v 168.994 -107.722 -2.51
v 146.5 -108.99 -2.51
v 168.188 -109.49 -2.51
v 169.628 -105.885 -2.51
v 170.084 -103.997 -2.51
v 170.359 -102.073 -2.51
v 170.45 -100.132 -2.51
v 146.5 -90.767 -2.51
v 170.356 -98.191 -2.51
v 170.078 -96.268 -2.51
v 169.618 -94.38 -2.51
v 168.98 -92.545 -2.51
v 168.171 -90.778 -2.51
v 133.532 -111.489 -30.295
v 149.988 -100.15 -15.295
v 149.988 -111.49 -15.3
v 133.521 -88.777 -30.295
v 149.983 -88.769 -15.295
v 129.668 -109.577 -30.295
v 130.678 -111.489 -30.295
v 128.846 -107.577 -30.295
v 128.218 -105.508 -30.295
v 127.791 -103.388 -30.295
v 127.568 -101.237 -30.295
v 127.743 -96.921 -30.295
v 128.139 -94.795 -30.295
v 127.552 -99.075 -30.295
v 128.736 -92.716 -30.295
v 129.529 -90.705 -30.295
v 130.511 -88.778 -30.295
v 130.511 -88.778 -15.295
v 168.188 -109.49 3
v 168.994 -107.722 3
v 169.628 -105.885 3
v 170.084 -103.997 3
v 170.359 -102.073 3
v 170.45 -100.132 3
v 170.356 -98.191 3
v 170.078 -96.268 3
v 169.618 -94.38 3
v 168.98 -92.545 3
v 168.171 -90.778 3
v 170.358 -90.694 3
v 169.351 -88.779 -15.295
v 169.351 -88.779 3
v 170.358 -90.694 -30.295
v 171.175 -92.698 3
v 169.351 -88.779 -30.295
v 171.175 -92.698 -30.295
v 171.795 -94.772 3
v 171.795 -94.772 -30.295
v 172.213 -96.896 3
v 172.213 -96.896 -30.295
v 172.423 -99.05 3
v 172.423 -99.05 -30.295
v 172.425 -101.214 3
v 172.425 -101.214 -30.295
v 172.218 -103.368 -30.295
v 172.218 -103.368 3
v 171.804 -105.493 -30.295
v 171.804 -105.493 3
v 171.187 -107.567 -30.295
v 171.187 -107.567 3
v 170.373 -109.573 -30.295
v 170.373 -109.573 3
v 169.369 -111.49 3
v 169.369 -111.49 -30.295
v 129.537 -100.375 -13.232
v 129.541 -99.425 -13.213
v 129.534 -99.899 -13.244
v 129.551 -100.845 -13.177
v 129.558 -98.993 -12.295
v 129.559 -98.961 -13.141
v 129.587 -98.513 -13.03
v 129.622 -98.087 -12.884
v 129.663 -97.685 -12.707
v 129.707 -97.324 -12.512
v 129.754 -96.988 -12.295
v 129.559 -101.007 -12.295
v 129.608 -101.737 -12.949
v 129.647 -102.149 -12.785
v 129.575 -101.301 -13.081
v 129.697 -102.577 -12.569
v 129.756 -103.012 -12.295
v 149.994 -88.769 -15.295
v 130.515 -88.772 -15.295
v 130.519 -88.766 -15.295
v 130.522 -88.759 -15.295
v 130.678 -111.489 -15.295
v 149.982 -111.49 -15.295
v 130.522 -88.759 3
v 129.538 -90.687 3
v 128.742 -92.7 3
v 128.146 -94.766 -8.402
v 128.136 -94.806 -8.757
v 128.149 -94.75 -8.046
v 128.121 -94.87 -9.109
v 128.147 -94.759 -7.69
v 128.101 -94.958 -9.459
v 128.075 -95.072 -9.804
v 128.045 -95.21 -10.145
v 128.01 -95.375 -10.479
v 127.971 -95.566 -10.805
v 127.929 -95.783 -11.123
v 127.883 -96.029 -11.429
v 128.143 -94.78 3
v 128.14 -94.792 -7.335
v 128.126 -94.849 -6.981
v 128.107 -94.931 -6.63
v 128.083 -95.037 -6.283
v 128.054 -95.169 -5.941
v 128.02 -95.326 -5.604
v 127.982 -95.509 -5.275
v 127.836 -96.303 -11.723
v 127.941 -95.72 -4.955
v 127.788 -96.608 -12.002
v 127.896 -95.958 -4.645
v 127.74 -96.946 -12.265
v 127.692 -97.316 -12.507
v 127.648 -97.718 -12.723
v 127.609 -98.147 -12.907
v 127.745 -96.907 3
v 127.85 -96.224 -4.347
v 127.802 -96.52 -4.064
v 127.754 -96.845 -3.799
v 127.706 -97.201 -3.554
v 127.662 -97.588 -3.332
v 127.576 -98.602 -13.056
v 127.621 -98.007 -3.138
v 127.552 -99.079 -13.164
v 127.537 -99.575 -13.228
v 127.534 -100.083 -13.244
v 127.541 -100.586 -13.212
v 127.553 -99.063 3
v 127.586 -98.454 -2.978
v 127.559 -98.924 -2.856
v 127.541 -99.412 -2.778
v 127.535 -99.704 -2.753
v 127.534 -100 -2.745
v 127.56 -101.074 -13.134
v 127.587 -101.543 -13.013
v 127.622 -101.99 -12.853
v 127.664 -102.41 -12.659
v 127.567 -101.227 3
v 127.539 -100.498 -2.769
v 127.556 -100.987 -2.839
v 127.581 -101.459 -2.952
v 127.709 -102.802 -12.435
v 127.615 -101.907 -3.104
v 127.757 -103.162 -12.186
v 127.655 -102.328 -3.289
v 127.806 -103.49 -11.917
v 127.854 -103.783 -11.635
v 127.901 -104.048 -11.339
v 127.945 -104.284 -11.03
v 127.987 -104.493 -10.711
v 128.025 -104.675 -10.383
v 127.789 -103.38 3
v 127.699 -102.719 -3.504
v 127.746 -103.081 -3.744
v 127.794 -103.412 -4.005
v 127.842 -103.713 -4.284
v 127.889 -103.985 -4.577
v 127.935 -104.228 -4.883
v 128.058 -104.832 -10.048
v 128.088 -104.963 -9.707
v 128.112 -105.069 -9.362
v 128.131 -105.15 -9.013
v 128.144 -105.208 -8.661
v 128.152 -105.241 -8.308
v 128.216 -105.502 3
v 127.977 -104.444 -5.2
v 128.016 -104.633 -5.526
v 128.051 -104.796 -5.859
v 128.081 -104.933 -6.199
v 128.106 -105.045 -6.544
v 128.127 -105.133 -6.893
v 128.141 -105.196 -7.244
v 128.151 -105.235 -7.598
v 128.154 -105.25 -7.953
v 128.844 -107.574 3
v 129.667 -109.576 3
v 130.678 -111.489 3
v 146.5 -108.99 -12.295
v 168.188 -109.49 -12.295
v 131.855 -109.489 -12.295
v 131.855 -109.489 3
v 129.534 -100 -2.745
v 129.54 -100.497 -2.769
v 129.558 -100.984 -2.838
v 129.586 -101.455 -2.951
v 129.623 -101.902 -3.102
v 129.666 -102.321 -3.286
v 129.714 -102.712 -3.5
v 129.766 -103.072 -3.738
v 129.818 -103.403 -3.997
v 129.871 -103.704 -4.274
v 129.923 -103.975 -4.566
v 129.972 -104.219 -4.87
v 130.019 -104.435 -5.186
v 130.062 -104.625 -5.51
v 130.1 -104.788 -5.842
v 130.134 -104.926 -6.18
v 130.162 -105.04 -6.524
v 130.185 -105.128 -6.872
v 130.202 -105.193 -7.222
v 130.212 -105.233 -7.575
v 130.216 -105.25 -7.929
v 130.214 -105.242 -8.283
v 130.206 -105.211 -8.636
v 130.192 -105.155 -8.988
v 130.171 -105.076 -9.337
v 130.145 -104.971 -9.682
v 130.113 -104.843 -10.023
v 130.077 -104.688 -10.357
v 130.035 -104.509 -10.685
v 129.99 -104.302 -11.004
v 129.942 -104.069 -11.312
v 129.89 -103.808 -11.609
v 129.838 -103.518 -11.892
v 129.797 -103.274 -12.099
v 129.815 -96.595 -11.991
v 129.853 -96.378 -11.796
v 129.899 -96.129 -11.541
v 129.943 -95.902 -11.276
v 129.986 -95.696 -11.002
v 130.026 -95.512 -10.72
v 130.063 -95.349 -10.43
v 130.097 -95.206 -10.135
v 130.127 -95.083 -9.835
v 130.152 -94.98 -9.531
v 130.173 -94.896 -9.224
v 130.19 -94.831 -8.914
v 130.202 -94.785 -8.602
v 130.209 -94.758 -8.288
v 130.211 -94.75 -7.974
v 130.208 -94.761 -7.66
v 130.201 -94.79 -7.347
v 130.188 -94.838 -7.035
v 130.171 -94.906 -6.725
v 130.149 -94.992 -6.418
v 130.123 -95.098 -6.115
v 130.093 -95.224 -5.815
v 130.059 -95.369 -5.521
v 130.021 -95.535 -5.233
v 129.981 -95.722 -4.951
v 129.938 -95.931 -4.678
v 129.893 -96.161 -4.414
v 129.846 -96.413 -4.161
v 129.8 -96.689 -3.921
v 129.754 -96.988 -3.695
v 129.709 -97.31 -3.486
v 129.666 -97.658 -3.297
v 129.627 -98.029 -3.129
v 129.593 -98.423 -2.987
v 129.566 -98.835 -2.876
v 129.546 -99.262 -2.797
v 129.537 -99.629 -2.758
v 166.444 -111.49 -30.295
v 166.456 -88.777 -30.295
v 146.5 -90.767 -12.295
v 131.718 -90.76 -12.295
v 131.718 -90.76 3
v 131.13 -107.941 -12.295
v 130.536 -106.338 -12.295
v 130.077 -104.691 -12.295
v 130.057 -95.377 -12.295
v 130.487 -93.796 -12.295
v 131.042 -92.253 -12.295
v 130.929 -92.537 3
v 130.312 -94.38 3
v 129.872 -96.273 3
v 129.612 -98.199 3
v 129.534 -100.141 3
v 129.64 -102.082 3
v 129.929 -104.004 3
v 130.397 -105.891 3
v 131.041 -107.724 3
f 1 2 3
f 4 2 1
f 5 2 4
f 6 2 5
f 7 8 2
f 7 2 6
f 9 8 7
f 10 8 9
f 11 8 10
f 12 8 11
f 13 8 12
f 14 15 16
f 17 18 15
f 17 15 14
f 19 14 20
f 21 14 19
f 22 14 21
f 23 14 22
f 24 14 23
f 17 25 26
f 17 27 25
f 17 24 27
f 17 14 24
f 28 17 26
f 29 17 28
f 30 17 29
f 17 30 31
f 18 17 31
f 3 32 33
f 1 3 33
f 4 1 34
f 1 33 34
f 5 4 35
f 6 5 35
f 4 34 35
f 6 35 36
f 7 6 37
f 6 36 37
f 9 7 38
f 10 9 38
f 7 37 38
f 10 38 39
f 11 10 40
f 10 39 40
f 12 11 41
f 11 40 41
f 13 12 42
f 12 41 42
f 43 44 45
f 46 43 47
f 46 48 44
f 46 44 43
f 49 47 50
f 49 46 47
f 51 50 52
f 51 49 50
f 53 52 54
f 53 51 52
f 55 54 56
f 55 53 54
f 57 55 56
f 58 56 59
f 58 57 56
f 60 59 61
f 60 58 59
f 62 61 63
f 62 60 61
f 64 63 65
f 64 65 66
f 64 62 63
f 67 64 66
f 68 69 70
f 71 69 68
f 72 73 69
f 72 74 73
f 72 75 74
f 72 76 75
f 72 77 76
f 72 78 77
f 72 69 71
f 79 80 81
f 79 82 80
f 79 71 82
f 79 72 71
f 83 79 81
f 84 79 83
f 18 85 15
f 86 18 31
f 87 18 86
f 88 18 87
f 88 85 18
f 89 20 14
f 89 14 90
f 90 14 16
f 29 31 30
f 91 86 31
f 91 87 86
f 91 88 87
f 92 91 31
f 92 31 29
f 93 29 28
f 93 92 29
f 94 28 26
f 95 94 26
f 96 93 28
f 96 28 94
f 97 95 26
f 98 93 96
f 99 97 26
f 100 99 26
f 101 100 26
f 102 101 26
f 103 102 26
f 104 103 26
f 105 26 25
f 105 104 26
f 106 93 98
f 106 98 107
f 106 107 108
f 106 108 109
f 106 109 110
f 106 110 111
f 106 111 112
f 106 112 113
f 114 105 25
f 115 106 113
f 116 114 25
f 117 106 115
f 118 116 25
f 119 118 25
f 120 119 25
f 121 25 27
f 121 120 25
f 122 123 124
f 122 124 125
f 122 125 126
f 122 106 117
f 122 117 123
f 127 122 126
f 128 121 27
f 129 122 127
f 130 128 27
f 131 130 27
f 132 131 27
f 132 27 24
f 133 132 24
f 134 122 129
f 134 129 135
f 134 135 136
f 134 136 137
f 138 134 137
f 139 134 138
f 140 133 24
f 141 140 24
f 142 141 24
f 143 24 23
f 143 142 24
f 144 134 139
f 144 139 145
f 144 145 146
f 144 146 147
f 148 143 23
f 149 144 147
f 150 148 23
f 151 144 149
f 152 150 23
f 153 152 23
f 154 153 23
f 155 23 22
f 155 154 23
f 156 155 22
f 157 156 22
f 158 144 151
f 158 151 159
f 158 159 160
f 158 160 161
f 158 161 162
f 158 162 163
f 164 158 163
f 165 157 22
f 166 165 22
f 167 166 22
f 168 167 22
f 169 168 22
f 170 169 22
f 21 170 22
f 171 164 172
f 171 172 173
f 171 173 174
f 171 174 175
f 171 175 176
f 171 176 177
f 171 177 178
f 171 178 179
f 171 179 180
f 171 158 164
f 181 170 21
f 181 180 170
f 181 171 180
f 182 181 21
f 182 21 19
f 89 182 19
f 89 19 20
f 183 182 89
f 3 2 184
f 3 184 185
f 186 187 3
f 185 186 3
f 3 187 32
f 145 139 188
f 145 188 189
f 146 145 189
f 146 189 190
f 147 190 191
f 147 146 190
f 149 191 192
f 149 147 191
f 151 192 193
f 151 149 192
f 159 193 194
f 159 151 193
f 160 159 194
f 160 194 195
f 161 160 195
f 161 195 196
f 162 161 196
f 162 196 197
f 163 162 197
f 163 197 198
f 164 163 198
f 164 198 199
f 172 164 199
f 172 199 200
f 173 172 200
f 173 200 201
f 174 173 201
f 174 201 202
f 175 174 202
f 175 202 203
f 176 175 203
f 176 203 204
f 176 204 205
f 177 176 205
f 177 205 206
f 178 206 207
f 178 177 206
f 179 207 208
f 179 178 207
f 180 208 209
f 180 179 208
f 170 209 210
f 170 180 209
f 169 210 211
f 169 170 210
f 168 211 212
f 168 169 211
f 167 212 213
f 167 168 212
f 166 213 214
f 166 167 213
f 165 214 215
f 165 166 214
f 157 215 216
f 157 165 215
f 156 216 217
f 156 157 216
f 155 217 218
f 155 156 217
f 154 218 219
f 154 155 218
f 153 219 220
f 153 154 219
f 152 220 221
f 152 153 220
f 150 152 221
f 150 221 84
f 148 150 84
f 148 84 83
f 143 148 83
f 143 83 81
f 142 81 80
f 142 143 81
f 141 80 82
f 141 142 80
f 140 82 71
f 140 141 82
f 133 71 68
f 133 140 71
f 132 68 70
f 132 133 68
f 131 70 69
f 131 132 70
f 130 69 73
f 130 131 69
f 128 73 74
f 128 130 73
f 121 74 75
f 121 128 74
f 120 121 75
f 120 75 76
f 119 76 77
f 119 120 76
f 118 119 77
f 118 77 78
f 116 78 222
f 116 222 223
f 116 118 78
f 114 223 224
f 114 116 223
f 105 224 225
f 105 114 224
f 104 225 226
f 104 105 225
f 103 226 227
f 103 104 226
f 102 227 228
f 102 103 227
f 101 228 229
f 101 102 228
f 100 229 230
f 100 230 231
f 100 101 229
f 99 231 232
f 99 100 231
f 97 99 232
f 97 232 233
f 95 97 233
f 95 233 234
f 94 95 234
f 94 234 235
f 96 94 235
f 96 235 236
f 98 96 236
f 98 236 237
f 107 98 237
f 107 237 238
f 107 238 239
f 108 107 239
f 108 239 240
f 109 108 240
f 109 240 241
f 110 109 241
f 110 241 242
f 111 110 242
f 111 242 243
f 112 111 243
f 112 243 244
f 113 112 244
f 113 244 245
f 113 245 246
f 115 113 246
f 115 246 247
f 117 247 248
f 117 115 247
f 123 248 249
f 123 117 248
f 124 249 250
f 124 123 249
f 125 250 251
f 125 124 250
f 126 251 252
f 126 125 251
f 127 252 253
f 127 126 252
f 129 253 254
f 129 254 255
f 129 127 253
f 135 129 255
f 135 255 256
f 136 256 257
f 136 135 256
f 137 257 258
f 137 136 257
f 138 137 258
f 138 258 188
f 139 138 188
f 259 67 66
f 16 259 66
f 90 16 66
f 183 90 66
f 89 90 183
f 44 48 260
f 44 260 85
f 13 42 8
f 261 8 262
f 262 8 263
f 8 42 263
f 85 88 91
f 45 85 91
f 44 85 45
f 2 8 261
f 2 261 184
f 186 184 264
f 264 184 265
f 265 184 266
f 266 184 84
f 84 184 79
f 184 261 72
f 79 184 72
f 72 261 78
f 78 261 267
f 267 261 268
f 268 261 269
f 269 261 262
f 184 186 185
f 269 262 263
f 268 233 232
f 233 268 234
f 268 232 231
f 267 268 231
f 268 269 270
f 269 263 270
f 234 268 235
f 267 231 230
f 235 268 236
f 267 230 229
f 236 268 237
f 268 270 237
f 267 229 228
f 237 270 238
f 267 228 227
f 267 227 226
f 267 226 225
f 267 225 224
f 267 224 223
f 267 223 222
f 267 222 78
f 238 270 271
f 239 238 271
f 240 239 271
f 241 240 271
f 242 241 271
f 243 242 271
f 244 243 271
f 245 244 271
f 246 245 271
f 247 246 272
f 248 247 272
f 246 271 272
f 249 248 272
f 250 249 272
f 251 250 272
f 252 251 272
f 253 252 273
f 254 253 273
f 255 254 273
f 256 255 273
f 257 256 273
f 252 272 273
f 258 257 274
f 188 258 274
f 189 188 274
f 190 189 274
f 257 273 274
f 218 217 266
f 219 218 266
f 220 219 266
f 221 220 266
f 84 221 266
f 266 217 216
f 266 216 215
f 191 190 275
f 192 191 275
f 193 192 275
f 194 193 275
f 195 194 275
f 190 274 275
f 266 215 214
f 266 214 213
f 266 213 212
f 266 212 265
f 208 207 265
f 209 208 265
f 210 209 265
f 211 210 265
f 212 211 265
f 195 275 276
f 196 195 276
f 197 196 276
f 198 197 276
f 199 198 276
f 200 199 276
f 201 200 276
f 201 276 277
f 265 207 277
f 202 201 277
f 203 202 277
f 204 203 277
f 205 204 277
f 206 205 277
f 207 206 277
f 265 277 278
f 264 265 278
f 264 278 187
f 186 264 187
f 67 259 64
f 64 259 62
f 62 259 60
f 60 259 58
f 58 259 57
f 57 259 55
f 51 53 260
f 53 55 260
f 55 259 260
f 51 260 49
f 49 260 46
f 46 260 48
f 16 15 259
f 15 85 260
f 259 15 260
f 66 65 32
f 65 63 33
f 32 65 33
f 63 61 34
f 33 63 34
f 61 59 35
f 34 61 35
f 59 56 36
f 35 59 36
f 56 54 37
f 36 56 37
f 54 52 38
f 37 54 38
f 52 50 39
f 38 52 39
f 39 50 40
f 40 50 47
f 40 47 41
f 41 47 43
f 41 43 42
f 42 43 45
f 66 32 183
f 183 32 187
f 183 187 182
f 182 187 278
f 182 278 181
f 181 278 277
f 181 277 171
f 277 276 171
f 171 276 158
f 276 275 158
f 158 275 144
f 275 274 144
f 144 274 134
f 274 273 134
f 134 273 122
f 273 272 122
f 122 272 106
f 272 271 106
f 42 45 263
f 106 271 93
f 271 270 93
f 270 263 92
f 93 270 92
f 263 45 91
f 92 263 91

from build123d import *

# Parameters (mm, degrees)
BOSS_EXTRUDE1_DEPTH     = 15.295
CUT_EXTRUDE1_DEPTH      = 206.919868261
FLOOR_START             = 3
FLOOR_2_DEPTH           = 3
BOSS_EXTRUDE4_START     = 9.785
BOSS_EXTRUDE4_DEPTH     = 9.785
CUT_EXTRUDE3_REACH      = 207.92
CUT_EXTRUDE3_END_RADIUS = 20.596434206
SKETCH7_R               = 5.25
BOSS_EXTRUDE5_REACH     = 176.665
SKETCH14_OUTSIDE_W      = 59.009
SKETCH14_OUTSIDE_H      = 36.805
CUT_EXTRUDE4_DEPTH      = 33.295


with BuildPart() as part:
    # Sketch1 → Boss-Extrude1 (new body)
    with BuildSketch(Plane(origin=(0, 0, -12.295), x_dir=(-1, 0, 0), z_dir=(0, 0, -1))):
        with BuildLine():
            Line((-169.369133898, -111.490025098), (-130.678433581, -111.48937301))
            ThreePointArc((-130.678433581, -111.48937301), (-127.534095849, -100.145401406), (-130.522109497, -88.759255177))
            Line((-130.522109497, -88.759255177), (-169.350721063, -88.778648203))
            ThreePointArc((-169.350721063, -88.778648203), (-172.450070697, -100.131831373), (-169.369133898, -111.490025098))
        make_face()
    extrude(amount=-BOSS_EXTRUDE1_DEPTH)

    # Sketch2 → Cut-Extrude1 (cut, through all)
    with BuildSketch(Plane.XY.offset(3)):
        with BuildLine():
            Line((168.171133654, -90.778059306), (131.717568579, -90.759852501))
            ThreePointArc((131.717568579, -90.759852501), (129.534116109, -100.141151153), (131.855022492, -109.48939284))
            Line((131.855022492, -109.48939284), (168.187605365, -109.490005184))
            ThreePointArc((168.187605365, -109.490005184), (170.450070154, -100.132033398), (168.171133654, -90.778059306))
        make_face()
    extrude(amount=-CUT_EXTRUDE1_DEPTH, mode=Mode.SUBTRACT)

    # Sketch4 → floor 2 (add)
    with BuildSketch(Plane(origin=(0, 0, -12.295), x_dir=(-1, 0, 0), z_dir=(0, 0, -1)).offset(FLOOR_START)):
        with BuildLine():
            Line((-169.369133898, -111.490025098), (-130.678433581, -111.48937301))
            ThreePointArc((-130.678433581, -111.48937301), (-127.534095849, -100.145401406), (-130.522109497, -88.759255177))
            Line((-130.522109497, -88.759255177), (-169.350721063, -88.778648203))
            ThreePointArc((-169.350721063, -88.778648203), (-172.450070697, -100.131831373), (-169.369133898, -111.490025098))
        make_face()
    extrude(amount=-FLOOR_2_DEPTH)

    # Sketch6 → Boss-Extrude4 (add)
    with BuildSketch(Plane.XY.offset(-12.295).offset(BOSS_EXTRUDE4_START)):
        with BuildLine():
            Line((146.5, -90.767235615), (146.5, -108.989639664))
            Line((146.5, -108.989639664), (168.187605365, -109.490005184))
            ThreePointArc((168.187605365, -109.490005184), (170.450070154, -100.132033398), (168.171133654, -90.778059306))
            Line((168.171133654, -90.778059306), (146.5, -90.767235615))
        make_face()
    extrude(amount=-BOSS_EXTRUDE4_DEPTH)

    # Cut-Extrude3: up to this cylinder (the profile starts outside it)
    cut_extrude3_end = Plane(origin=(150.129995683, -99.990000393, -7.995), z_dir=(0, 0, 1)) * Cylinder(CUT_EXTRUDE3_END_RADIUS, 458.032868411, mode=Mode.PRIVATE)
    # Sketch7 → Cut-Extrude3 (cut, up to the surface)
    with BuildSketch(Plane(origin=(0, 0, 0), x_dir=(0, 0, -1), z_dir=(1, 0, 0)), mode=Mode.PRIVATE) as cut_extrude3_sk1:
        with Locations(Location((7.995, -100, 0), (0, 0, 180))):
            Circle(SKETCH7_R)
    cut_extrude3_tool1 = extrude(cut_extrude3_sk1.sketch, amount=CUT_EXTRUDE3_REACH, mode=Mode.PRIVATE) - cut_extrude3_end
    add(cut_extrude3_tool1.solids().sort_by_distance((0, -100, -7.995))[0], mode=Mode.SUBTRACT)

    # Boss-Extrude5: up to this face of the body (flat: up to its plane)
    boss_extrude5_end = Plane(part.part.faces().sort_by_distance((150.023783739, -111.489699054, -6.1475))[0])
    # Sketch11 → Boss-Extrude5 (add, up to the picked face)
    with BuildSketch(Plane(origin=(-0.044298414, -88.694043528, 0), x_dir=(0.9999998752738909, -0.0004994519023308322, 0), z_dir=(0.0004994519023308322, 0.9999998752738909, 0)), mode=Mode.PRIVATE) as boss_extrude5_sk1:
        Polygon((150.03815576, 15.295), (166.500079456, 30.295), (172.500079456, 30.295), (172.500079456, 15.295), align=None)
    boss_extrude5_tool1 = split(extrude(boss_extrude5_sk1.sketch, amount=-BOSS_EXTRUDE5_REACH, mode=Mode.PRIVATE), bisect_by=boss_extrude5_end, keep=Keep.BOTH, mode=Mode.PRIVATE)
    boss_extrude5 = boss_extrude5_tool1.solids().sort_by(Axis((164.546837, -88.776249, -21.34904), (-0.0004994519023308322, -0.9999998752738909, 0)))[0]
    add(boss_extrude5)

    # Mirror1: Boss-Extrude5 across plane
    add(boss_extrude5.mirror(Plane(origin=(149.98984246, -0.002527909, 0), x_dir=(0, 0, 1), z_dir=(-0.9999999998579736, 1.6853871084051315e-05, 0))))

    # Sketch14 outside → Cut-Extrude4 (cut)
    with BuildSketch(Plane.XY.offset(3)):
        with Locations((149.9885, -100.1245)):
            Rectangle(SKETCH14_OUTSIDE_W, SKETCH14_OUTSIDE_H)
        with BuildLine():
            Line((169.350721063, -88.778648203), (130.522109497, -88.759255177))
            ThreePointArc((130.522109497, -88.759255177), (127.534095849, -100.145401406), (130.678433581, -111.48937301))
            Line((130.678433581, -111.48937301), (169.369133898, -111.490025098))
            ThreePointArc((169.369133898, -111.490025098), (172.450070697, -100.131831373), (169.350721063, -88.778648203))
        make_face(mode=Mode.SUBTRACT)
    extrude(amount=-CUT_EXTRUDE4_DEPTH, mode=Mode.SUBTRACT)


solid = part.part
